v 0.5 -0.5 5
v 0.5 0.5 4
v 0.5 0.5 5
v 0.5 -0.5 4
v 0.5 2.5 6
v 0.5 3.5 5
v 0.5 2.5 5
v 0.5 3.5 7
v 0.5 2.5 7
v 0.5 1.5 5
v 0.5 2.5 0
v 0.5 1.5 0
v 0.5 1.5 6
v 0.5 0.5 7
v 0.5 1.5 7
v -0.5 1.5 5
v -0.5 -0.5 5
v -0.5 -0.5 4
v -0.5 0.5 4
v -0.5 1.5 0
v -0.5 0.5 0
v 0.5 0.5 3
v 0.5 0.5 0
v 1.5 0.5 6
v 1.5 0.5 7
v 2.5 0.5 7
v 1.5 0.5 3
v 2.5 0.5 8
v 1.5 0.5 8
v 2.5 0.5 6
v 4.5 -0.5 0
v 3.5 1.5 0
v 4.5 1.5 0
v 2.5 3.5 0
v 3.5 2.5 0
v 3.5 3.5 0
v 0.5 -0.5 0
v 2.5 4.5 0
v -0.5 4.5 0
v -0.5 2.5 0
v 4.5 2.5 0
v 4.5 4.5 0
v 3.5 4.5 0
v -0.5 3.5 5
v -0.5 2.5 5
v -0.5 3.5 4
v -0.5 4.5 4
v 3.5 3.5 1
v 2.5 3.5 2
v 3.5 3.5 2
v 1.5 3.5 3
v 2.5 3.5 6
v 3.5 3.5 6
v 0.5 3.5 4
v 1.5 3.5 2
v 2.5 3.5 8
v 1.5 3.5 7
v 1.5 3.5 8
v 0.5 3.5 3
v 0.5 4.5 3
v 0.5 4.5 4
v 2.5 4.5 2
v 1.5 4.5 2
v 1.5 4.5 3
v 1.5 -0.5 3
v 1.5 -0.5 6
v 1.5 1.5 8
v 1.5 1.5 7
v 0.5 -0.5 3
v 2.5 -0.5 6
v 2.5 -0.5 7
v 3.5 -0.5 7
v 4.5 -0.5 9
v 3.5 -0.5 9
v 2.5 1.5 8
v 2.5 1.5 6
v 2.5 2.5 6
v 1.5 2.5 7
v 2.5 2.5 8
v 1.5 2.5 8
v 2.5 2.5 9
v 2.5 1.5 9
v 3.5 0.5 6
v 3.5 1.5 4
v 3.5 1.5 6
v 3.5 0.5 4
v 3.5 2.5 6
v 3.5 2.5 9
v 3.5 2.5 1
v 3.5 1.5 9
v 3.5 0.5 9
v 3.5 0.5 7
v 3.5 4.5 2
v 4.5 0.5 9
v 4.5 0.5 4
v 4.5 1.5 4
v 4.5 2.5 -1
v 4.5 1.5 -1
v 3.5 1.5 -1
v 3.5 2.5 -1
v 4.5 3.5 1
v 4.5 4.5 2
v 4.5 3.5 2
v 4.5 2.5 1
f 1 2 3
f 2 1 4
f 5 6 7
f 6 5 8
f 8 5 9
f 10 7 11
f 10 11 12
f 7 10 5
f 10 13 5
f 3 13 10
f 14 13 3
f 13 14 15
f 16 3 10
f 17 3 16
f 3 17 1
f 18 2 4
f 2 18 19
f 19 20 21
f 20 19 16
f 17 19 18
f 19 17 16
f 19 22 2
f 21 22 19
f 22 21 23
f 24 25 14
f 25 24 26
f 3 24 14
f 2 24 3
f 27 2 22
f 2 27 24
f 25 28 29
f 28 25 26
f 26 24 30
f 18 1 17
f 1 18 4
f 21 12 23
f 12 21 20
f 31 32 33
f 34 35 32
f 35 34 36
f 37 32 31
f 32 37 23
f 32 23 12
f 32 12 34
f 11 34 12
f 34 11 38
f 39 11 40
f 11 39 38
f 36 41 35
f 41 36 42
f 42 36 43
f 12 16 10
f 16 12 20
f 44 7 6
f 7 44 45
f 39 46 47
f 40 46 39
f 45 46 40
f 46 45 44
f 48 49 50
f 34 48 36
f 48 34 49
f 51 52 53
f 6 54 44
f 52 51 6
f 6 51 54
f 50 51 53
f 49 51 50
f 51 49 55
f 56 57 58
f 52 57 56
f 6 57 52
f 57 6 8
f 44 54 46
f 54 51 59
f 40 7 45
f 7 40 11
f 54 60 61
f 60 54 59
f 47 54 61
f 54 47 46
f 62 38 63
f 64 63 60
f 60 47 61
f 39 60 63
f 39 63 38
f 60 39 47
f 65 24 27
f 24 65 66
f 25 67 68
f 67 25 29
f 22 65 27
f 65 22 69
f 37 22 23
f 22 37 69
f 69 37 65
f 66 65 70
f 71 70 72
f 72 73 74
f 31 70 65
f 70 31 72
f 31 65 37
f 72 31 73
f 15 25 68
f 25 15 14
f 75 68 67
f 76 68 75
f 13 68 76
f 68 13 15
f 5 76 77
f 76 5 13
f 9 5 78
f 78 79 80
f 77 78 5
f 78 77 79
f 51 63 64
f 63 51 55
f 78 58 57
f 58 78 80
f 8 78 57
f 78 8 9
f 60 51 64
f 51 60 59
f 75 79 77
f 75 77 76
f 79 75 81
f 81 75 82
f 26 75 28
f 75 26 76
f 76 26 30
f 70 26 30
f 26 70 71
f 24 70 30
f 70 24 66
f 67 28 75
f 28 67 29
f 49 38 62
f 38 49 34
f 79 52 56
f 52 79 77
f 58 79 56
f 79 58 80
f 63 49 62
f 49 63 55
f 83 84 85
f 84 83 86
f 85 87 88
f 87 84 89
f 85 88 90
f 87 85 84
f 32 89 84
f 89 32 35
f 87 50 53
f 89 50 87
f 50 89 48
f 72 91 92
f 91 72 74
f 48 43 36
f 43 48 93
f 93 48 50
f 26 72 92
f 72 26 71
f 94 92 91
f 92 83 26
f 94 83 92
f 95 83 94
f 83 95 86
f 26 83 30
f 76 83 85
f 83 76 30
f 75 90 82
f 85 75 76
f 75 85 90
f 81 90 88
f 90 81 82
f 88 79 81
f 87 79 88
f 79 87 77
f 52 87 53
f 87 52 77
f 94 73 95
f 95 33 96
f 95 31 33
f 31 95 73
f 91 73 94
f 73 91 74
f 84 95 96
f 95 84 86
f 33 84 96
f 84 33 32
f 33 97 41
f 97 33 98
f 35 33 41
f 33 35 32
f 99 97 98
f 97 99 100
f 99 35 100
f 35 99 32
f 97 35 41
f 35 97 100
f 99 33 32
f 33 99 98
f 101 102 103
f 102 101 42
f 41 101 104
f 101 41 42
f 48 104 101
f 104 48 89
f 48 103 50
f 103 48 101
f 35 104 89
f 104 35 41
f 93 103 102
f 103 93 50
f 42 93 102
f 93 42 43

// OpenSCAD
union() {
    translate([0, 0, 4.5]) color([1, 0, 0]) cube([1, 1, 1], center=true);
    translate([0, 1, 2.5]) cube([1, 1, 5], center=true);
    translate([0, 3, 2.5]) cube([1, 1, 5], center=true);
    translate([0, 4, 2.0]) cube([1, 1, 4], center=true);
    translate([1, 0, 1.5]) cube([1, 1, 3], center=true);
    translate([1, 1, 3.5]) cube([1, 1, 7], center=true);
    translate([1, 2, 3.0]) cube([1, 1, 6], center=true);
    translate([1, 3, 3.5]) cube([1, 1, 7], center=true);
    translate([1, 4, 1.5]) cube([1, 1, 3], center=true);
    translate([2, 0, 3.0]) cube([1, 1, 6], center=true);
    translate([2, 1, 4.0]) cube([1, 1, 8], center=true);
    translate([2, 2, 3.0]) cube([1, 1, 6], center=true);
    translate([2, 3, 4.0]) cube([1, 1, 8], center=true);
    translate([2, 4, 1.0]) cube([1, 1, 2], center=true);
    translate([3, 0, 3.5]) cube([1, 1, 7], center=true);
    translate([3, 1, 3.0]) cube([1, 1, 6], center=true);
    translate([3, 2, 4.5]) cube([1, 1, 9], center=true);
    translate([3, 3, 3.0]) cube([1, 1, 6], center=true);
    translate([4, 0, 4.5]) cube([1, 1, 9], center=true);
    translate([4, 1, 2.0]) cube([1, 1, 4], center=true);
    translate([4, 2, -0.5]) color([0, 0, 1]) cube([1, 1, 1], center=true);
    translate([4, 3, 0.5]) cube([1, 1, 1], center=true);
    translate([4, 4, 1.0]) cube([1, 1, 2], center=true);
}
